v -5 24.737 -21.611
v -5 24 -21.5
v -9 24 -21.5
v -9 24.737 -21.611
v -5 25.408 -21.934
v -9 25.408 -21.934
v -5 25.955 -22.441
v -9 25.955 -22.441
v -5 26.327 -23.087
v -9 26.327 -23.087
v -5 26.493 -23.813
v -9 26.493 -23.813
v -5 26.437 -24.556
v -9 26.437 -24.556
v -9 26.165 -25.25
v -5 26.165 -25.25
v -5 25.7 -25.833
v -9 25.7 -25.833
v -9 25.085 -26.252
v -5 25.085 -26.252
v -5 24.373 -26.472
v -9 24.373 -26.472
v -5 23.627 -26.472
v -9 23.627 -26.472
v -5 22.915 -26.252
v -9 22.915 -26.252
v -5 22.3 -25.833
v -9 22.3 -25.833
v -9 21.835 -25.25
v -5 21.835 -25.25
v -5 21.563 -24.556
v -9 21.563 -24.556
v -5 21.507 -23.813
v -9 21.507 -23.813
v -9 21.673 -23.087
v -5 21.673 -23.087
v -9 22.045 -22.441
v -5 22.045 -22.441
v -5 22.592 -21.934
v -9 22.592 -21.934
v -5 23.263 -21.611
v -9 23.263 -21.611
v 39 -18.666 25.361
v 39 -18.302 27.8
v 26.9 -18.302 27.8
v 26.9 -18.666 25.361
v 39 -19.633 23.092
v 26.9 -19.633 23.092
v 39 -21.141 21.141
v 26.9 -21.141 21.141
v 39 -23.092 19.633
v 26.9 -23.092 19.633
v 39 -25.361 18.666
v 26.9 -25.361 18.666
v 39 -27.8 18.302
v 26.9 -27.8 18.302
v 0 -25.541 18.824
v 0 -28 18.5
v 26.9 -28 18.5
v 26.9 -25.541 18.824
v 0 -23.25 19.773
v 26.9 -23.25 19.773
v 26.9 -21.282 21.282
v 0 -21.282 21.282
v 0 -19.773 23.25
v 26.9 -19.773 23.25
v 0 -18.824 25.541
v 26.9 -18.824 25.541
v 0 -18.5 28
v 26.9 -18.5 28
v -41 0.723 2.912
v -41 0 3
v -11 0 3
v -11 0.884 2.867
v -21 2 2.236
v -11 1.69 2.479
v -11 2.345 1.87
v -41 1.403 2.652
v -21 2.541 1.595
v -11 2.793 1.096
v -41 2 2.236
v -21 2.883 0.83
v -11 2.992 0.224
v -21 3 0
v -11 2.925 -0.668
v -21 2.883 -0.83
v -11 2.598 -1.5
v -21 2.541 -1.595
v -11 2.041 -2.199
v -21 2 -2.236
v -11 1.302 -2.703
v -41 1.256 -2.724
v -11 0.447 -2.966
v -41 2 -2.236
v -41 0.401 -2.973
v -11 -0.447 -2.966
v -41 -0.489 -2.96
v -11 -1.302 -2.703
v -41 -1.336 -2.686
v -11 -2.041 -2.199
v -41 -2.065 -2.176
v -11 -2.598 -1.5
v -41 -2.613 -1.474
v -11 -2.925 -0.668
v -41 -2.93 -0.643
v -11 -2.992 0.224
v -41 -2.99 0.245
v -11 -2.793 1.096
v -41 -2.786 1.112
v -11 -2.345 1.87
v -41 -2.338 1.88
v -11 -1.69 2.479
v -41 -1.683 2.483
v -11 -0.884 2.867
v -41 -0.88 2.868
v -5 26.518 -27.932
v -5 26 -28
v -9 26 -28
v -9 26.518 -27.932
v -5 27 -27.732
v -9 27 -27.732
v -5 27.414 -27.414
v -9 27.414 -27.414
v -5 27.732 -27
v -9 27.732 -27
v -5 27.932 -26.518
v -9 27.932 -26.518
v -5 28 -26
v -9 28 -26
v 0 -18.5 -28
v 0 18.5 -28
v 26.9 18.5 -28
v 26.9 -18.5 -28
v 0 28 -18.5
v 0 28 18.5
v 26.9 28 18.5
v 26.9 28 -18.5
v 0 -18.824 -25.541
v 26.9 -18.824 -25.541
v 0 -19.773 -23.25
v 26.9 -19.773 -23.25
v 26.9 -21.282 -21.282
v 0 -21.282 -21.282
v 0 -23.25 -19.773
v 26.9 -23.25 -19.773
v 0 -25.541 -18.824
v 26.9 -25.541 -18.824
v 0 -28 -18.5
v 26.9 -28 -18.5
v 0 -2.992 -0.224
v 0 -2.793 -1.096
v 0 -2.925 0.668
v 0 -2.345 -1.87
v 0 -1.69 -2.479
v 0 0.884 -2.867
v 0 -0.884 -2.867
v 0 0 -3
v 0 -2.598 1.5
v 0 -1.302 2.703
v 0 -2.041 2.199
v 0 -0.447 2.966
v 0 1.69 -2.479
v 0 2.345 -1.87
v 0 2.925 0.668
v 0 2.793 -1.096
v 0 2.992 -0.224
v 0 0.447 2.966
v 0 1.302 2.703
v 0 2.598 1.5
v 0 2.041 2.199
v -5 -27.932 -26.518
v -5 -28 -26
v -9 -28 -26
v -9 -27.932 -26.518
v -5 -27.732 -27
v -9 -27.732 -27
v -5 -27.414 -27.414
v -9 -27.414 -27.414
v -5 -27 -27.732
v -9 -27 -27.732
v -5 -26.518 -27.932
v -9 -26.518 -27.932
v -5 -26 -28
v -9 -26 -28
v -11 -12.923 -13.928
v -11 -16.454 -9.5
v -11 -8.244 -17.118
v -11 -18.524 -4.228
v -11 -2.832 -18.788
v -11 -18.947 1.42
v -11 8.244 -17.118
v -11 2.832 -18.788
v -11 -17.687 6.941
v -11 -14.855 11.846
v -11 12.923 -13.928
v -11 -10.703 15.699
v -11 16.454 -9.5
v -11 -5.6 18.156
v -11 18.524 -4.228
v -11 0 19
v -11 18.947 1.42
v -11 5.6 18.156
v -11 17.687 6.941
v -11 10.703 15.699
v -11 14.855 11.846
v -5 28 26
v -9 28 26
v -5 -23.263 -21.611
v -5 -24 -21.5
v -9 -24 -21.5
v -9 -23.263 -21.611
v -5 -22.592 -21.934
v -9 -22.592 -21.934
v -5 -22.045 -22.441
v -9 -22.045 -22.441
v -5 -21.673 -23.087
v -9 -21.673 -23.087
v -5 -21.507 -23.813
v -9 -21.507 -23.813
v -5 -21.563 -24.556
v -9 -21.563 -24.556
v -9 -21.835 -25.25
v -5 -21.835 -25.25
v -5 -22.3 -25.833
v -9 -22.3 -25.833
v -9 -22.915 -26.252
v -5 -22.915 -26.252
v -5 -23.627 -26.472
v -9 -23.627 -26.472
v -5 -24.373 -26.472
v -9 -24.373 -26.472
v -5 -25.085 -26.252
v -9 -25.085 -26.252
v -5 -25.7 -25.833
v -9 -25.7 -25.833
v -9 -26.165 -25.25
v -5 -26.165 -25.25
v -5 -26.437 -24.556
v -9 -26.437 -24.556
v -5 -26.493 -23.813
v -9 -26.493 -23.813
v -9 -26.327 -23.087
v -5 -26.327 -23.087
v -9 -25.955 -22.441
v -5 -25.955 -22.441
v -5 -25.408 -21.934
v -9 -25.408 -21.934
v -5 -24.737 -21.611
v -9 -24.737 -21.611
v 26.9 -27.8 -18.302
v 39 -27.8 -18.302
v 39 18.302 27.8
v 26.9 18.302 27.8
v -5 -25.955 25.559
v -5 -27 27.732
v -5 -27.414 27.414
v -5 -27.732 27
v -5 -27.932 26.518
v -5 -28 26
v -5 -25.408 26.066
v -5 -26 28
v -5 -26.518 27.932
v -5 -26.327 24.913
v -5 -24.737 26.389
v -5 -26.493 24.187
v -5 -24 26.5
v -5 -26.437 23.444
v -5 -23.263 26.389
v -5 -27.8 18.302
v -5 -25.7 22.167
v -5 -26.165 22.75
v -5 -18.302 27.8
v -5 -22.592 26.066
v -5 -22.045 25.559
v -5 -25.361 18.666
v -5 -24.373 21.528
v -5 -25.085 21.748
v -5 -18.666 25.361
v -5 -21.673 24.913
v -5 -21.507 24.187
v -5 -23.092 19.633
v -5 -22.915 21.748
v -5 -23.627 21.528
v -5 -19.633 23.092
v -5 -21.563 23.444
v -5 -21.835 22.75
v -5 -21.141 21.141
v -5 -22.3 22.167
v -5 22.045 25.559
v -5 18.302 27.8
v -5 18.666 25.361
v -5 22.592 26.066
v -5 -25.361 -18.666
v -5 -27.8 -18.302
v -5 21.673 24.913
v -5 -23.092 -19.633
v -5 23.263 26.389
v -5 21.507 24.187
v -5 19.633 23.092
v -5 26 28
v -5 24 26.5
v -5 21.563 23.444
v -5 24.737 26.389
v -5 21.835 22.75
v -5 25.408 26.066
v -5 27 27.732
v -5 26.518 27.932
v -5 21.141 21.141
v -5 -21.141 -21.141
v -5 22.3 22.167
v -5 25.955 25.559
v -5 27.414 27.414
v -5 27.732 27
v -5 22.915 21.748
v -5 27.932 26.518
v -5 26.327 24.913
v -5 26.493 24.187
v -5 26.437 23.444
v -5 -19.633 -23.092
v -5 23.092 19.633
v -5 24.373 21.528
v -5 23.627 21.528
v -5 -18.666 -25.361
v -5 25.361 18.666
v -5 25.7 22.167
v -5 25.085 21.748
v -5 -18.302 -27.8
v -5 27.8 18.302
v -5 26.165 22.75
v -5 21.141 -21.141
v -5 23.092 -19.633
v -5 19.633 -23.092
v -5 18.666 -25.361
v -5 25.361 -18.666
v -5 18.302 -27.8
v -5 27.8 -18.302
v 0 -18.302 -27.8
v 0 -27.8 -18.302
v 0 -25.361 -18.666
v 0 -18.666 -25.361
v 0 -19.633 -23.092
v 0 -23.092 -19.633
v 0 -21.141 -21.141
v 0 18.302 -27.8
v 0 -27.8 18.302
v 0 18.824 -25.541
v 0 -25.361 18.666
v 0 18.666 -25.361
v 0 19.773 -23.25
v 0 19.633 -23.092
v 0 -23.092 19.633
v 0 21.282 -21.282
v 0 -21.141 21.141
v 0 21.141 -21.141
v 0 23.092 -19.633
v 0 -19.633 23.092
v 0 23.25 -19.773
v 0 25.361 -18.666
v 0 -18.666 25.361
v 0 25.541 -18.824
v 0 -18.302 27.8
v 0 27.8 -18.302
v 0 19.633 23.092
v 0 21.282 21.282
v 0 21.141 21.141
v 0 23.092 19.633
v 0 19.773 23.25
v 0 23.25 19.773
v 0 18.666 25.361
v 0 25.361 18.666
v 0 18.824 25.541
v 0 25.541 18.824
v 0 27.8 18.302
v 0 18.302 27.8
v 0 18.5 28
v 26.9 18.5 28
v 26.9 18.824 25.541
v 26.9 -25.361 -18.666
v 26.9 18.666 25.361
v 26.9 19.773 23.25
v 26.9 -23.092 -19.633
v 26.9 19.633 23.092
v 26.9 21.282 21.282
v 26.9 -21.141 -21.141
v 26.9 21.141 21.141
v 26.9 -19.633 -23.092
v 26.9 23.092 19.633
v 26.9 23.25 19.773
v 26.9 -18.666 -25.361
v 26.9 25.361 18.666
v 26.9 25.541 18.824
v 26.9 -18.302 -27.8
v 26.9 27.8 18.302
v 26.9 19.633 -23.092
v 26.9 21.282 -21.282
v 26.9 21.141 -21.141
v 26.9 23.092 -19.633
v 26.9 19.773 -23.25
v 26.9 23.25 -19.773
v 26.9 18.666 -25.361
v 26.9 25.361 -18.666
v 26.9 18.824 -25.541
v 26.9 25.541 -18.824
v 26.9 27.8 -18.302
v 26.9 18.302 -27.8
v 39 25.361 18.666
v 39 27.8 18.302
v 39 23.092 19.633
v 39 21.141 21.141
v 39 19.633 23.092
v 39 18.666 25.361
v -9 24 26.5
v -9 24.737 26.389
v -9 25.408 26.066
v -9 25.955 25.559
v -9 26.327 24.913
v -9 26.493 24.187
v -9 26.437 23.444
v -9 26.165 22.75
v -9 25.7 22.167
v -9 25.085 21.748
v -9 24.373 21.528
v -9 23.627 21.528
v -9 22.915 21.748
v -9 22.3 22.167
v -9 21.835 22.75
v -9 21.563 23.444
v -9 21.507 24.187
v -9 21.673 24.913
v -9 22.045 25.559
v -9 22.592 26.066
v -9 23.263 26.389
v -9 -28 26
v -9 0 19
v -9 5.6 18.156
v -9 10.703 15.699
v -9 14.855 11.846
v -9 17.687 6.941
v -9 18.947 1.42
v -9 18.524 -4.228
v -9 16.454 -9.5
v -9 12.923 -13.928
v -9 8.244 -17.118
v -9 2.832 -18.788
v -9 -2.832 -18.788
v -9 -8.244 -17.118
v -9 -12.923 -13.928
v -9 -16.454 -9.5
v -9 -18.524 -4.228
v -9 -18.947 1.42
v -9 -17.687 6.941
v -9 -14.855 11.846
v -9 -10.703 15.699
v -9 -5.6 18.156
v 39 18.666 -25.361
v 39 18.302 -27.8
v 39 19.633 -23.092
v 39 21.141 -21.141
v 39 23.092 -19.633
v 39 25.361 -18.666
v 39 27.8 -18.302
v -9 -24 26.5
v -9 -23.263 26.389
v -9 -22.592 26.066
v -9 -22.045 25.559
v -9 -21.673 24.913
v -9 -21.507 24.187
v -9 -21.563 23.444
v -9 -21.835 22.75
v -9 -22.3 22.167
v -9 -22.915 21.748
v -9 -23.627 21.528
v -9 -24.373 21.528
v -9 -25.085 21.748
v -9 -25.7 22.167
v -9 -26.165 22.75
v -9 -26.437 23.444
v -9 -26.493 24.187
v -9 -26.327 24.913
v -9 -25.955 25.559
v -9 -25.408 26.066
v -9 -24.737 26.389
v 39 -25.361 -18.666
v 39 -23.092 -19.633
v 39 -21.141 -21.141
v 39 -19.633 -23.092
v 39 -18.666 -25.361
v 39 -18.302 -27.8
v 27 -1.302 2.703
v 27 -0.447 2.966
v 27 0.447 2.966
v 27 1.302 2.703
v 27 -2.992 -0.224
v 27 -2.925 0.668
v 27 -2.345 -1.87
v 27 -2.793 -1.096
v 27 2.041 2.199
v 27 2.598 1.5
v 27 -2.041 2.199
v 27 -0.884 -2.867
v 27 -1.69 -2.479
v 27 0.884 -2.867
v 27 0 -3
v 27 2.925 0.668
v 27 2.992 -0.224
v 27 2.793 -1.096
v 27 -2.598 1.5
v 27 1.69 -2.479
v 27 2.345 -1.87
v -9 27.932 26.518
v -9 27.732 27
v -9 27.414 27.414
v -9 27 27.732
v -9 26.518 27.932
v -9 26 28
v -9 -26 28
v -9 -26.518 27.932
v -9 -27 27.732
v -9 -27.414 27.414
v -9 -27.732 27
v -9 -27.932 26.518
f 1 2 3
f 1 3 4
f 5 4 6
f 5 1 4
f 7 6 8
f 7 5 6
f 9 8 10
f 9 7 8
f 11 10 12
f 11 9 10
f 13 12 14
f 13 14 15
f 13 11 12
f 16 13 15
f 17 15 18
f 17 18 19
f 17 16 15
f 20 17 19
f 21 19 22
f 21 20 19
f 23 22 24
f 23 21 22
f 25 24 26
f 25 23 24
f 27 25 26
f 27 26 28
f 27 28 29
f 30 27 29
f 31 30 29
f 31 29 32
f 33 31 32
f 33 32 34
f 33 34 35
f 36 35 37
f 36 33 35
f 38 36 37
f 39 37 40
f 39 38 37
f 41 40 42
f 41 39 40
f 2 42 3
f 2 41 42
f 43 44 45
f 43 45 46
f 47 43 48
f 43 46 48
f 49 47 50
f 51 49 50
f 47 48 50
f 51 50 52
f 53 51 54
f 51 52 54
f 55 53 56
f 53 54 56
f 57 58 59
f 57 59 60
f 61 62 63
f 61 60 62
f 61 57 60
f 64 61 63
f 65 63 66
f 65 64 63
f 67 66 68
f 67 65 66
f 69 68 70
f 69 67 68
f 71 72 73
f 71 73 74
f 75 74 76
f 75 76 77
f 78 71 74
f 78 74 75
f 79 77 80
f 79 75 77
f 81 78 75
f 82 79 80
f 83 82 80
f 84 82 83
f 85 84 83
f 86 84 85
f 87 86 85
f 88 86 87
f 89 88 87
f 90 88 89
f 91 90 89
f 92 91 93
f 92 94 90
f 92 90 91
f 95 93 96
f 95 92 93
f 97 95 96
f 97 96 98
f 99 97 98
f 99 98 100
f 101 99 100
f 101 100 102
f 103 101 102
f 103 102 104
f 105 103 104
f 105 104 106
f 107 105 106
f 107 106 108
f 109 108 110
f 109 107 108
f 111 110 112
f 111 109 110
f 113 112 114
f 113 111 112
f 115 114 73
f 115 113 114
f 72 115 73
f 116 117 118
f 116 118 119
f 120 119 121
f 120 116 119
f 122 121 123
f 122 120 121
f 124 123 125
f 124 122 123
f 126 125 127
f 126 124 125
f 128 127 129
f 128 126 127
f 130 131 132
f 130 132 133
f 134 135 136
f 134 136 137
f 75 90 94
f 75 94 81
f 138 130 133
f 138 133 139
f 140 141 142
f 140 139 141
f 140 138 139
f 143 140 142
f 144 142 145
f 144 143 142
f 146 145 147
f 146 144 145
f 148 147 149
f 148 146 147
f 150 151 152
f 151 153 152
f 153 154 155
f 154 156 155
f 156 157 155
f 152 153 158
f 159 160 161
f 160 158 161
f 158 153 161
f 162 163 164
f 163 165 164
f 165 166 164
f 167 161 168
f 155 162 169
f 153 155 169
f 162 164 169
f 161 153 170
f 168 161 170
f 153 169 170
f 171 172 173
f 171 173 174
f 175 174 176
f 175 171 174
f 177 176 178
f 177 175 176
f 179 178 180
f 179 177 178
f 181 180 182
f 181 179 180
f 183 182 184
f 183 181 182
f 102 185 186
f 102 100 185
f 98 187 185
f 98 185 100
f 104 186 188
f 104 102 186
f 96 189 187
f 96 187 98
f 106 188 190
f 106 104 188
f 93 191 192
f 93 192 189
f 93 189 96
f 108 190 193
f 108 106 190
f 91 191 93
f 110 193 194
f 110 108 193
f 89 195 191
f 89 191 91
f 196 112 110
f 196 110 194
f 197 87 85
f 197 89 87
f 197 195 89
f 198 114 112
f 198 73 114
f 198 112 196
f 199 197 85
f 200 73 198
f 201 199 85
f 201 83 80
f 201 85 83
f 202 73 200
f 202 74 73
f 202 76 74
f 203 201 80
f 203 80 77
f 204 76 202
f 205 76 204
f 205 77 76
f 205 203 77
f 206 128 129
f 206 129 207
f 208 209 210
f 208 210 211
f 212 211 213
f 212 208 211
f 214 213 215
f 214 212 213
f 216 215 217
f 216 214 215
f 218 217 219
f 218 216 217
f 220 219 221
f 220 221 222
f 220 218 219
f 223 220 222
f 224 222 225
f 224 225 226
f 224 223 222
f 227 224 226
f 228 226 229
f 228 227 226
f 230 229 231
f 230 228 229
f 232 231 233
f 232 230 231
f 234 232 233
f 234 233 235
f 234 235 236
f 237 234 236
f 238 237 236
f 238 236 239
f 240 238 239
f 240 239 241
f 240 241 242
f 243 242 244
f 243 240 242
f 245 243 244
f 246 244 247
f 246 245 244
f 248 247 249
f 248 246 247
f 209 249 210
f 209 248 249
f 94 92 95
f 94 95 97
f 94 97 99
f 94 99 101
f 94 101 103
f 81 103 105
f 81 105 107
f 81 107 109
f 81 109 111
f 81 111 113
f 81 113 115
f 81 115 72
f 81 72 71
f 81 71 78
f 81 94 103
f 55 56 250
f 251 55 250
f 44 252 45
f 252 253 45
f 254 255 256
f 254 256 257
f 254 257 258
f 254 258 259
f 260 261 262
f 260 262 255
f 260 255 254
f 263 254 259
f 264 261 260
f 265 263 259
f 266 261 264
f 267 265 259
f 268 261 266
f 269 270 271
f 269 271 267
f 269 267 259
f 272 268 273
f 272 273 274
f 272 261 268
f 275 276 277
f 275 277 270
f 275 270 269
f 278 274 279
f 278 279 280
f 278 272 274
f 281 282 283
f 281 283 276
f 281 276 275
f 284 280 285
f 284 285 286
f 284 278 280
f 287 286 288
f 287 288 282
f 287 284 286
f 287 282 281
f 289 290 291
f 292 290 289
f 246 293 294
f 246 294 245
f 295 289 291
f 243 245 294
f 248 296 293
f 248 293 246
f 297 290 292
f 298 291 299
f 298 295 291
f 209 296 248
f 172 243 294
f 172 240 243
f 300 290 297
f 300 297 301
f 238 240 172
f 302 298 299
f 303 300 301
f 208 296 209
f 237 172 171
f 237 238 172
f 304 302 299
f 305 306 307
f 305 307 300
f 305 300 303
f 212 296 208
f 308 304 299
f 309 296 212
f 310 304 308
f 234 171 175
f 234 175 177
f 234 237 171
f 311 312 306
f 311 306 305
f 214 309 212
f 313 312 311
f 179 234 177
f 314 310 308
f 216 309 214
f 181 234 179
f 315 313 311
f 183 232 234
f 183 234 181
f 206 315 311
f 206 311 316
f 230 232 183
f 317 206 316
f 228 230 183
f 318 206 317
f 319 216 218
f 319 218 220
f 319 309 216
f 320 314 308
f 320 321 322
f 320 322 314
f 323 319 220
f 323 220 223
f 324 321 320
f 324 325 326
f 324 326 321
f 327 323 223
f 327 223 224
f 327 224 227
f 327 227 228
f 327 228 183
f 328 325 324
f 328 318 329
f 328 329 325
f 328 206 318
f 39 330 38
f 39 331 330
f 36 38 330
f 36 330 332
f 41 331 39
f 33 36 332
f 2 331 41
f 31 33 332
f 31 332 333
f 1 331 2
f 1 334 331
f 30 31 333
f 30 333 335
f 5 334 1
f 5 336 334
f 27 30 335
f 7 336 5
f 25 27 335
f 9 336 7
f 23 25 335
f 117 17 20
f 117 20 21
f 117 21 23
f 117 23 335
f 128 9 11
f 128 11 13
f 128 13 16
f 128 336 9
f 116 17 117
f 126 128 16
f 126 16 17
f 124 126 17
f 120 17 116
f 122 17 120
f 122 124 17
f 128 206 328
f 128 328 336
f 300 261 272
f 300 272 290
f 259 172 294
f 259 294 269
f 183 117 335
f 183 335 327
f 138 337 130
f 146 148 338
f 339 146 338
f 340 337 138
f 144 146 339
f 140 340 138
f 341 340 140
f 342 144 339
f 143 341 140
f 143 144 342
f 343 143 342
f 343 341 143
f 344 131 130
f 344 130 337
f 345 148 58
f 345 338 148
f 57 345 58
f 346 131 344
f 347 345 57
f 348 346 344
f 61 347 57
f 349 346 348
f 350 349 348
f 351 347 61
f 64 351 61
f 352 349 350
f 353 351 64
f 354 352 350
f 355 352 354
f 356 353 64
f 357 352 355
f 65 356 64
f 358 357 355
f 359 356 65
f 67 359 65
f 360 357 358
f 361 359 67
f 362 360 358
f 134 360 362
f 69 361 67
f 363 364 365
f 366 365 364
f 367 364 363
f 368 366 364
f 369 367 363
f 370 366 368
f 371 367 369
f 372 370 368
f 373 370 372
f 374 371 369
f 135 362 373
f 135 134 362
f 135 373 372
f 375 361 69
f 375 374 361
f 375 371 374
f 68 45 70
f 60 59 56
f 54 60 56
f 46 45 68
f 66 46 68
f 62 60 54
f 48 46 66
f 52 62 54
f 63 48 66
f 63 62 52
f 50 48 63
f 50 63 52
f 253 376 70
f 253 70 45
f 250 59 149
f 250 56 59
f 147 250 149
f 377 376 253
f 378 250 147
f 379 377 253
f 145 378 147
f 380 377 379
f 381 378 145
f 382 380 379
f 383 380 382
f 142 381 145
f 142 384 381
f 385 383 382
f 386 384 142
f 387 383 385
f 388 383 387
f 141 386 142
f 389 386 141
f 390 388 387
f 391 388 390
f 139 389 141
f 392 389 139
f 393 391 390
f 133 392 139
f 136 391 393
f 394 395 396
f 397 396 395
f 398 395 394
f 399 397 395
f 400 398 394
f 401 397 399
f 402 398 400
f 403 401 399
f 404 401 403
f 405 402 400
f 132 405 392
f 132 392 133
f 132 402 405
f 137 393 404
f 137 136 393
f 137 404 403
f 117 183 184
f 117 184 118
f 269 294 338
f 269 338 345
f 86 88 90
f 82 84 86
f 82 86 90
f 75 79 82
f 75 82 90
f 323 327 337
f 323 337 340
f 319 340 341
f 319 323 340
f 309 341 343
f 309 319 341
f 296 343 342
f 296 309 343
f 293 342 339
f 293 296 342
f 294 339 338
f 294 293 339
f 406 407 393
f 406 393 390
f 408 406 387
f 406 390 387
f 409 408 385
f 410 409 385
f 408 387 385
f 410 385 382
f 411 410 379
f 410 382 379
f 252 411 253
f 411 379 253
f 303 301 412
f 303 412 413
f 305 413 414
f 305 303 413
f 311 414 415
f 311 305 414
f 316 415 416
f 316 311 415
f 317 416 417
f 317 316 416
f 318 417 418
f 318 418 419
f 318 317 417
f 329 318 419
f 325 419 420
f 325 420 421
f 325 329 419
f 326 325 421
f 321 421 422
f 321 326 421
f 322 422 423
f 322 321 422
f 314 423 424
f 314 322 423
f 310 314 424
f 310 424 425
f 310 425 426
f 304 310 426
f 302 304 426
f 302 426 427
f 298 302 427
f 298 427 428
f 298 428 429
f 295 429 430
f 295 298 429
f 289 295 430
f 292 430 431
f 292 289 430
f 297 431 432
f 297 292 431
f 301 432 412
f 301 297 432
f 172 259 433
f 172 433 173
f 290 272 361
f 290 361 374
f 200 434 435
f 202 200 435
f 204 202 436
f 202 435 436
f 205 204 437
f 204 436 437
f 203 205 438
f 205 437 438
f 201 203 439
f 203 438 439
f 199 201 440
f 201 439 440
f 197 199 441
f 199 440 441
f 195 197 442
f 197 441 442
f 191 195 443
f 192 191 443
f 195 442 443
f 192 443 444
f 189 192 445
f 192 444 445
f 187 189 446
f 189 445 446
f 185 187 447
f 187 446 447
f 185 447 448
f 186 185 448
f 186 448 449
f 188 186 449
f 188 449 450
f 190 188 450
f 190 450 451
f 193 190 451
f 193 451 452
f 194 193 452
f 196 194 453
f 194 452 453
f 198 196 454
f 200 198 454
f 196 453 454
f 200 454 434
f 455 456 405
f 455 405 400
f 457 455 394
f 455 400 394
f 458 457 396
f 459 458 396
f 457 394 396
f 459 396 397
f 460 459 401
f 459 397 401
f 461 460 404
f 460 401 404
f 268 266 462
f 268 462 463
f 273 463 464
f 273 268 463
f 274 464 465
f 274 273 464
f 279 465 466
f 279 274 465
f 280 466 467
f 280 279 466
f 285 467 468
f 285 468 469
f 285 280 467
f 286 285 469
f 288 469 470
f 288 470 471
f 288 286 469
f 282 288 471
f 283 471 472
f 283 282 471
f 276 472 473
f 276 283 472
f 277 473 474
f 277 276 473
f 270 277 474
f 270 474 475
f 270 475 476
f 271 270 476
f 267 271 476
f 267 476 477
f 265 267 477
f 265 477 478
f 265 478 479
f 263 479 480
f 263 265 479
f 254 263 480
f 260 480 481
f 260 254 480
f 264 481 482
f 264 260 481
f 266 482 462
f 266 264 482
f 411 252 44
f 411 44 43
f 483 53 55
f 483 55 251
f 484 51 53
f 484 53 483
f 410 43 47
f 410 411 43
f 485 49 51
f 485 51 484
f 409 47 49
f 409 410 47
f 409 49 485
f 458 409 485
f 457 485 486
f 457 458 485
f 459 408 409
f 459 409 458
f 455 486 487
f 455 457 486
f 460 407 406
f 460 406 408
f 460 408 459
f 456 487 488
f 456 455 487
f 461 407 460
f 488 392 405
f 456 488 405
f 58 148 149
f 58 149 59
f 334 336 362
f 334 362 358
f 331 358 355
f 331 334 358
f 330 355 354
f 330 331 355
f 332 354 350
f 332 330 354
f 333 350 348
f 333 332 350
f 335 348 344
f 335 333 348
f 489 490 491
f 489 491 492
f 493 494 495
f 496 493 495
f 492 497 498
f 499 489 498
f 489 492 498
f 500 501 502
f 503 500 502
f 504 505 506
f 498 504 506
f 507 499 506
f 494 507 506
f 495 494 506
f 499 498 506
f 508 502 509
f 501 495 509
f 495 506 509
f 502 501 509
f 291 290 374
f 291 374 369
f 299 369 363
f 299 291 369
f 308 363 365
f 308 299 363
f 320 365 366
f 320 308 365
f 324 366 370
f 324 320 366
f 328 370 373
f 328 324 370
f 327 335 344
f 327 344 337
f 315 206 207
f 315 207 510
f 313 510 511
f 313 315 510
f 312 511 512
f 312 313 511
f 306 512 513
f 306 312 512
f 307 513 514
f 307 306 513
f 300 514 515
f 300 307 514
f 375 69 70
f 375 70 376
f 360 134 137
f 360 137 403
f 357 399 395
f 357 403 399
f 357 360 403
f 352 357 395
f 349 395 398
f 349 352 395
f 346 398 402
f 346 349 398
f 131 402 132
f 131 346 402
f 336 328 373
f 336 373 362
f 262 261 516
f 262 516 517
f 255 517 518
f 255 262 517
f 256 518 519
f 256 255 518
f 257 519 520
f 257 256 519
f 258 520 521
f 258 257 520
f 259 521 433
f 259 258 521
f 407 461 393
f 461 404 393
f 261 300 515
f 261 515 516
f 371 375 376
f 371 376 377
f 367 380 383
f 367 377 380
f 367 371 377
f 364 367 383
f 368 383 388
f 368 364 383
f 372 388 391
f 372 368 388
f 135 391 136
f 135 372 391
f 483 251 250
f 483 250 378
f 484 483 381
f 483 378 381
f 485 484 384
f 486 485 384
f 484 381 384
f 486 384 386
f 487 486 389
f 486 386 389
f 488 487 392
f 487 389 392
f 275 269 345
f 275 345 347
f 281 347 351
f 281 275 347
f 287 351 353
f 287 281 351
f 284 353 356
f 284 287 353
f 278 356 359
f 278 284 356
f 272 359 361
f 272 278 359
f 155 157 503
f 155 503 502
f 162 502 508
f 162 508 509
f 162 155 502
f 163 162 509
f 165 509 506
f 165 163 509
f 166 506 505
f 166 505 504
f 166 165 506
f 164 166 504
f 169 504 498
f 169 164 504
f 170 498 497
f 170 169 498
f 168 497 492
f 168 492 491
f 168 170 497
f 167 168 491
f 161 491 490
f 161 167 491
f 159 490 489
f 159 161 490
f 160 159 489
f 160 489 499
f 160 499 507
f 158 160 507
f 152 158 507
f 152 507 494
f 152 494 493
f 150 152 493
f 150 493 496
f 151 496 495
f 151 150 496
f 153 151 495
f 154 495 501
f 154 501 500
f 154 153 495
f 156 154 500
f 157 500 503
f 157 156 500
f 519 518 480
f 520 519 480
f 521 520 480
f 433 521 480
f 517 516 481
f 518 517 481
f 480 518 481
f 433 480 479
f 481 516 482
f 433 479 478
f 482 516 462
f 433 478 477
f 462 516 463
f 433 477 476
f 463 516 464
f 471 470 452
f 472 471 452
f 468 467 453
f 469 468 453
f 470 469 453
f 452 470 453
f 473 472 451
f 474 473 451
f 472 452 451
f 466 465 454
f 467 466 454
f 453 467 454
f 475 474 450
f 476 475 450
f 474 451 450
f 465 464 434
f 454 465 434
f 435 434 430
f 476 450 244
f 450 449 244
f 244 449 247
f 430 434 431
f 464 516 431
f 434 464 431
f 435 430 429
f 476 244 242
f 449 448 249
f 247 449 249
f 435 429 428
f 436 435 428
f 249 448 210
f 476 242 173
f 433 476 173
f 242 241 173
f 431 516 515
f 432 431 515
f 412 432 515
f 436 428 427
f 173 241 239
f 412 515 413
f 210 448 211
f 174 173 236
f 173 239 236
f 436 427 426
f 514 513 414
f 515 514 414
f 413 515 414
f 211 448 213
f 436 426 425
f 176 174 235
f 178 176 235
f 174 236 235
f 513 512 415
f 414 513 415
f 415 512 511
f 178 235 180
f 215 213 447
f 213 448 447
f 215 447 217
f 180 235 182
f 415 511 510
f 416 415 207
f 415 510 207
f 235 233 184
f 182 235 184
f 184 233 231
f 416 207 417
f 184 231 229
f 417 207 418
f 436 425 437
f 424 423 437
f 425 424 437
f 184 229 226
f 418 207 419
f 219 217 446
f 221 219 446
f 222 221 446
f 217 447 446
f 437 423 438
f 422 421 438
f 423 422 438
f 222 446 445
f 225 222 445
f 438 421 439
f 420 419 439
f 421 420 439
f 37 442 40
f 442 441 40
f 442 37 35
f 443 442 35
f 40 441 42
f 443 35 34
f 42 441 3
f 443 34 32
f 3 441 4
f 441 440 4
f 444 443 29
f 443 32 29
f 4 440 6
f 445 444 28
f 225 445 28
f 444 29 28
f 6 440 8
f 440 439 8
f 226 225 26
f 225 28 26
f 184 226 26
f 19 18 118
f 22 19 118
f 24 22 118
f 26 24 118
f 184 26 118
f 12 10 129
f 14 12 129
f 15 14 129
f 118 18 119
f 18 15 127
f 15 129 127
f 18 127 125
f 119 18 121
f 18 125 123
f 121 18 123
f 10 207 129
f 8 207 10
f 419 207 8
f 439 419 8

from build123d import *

# Parameters (mm, degrees)
SKETCH1_R           = 3
BOSS_EXTRUDE1_DEPTH = 27
CUT_EXTRUDE4_START  = -0.1
CUT_EXTRUDE4_DEPTH  = 0.1
BOSS_EXTRUDE4_DEPTH = 12
BOSS_EXTRUDE5_START = 5
BOSS_EXTRUDE5_DEPTH = 5
SKETCH14_R          = 2.5
BOSS_EXTRUDE7_DEPTH = 4
SKETCH15_R          = 19
BOSS_EXTRUDE8_DEPTH = 2
BOSS_EXTRUDE9_START = 30
SKETCH16_R          = 3
BOSS_EXTRUDE9_DEPTH = 30
SKETCH17_W          = 6
SKETCH17_H          = 6
CUT_EXTRUDE5_DEPTH  = 20


with BuildPart() as part:
    # Sketch1 → Boss-Extrude1 (new body)
    with BuildSketch(Plane(origin=(0, 0, 0), x_dir=(0, 0, -1), z_dir=(1, 0, 0))):
        with BuildLine():
            Line((-18.5, 28), (18.5, 28))
            ThreePointArc((18.5, 28), (21.282485579, 21.282485579), (28, 18.5))
            Line((28, 18.5), (28, -18.5))
            ThreePointArc((28, -18.5), (21.282485579, -21.282485579), (18.5, -28))
            Line((18.5, -28), (-18.5, -28))
            ThreePointArc((-18.5, -28), (-21.282485579, -21.282485579), (-28, -18.5))
            Line((-28, -18.5), (-28, 18.5))
            ThreePointArc((-28, 18.5), (-21.282485579, 21.282485579), (-18.5, 28))
        make_face()
        Circle(SKETCH1_R, mode=Mode.SUBTRACT)
    extrude(amount=BOSS_EXTRUDE1_DEPTH)

    # Sketch6 → Cut-Extrude4 (cut)
    with BuildSketch(Plane(origin=(27, 0, 0), x_dir=(0, 0, -1), z_dir=(1, 0, 0)).offset(CUT_EXTRUDE4_START)):
        with BuildLine():
            Line((28, -18.5), (28, 18.5))
            ThreePointArc((28, 18.5), (21.282485579, 21.282485579), (18.5, 28))
            Line((18.5, 28), (-18.5, 28))
            ThreePointArc((-18.5, 28), (-21.282485579, 21.282485579), (-28, 18.5))
            Line((-28, 18.5), (-28, -18.5))
            ThreePointArc((-28, -18.5), (-21.282485579, -21.282485579), (-18.5, -28))
            Line((-18.5, -28), (18.5, -28))
            ThreePointArc((18.5, -28), (21.282485579, -21.282485579), (28, -18.5))
        make_face()
        with BuildLine():
            Line((18.302062075, 27.8), (-18.302062075, 27.8))
            ThreePointArc((-18.302062075, 27.8), (-21.141064222, 21.141064222), (-27.8, 18.302062075))
            Line((-27.8, 18.302062075), (-27.8, -18.302062075))
            ThreePointArc((-27.8, -18.302062075), (-21.141064222, -21.141064222), (-18.302062075, -27.8))
            Line((-18.302062075, -27.8), (18.302062075, -27.8))
            ThreePointArc((18.302062075, -27.8), (21.141064222, -21.141064222), (27.8, -18.302062075))
            Line((27.8, -18.302062075), (27.8, 18.302062075))
            ThreePointArc((27.8, 18.302062075), (21.141064222, 21.141064222), (18.302062075, 27.8))
        make_face(mode=Mode.SUBTRACT)
    extrude(amount=CUT_EXTRUDE4_DEPTH, mode=Mode.SUBTRACT)

    # Sketch10 → Boss-Extrude4 (add)
    with BuildSketch(Plane(origin=(27, 0, 0), x_dir=(0, 0, -1), z_dir=(1, 0, 0))):
        with BuildLine():
            Line((27.8, -18.302062075), (27.8, 18.302062075))
            ThreePointArc((27.8, 18.302062075), (21.141064222, 21.141064222), (18.302062075, 27.8))
            Line((18.302062075, 27.8), (-18.302062075, 27.8))
            ThreePointArc((-18.302062075, 27.8), (-21.141064222, 21.141064222), (-27.8, 18.302062075))
            Line((-27.8, 18.302062075), (-27.8, -18.302062075))
            ThreePointArc((-27.8, -18.302062075), (-21.141064222, -21.141064222), (-18.302062075, -27.8))
            Line((-18.302062075, -27.8), (18.302062075, -27.8))
            ThreePointArc((18.302062075, -27.8), (21.141064222, -21.141064222), (27.8, -18.302062075))
        make_face()
    extrude(amount=BOSS_EXTRUDE4_DEPTH)

    # Sketch12 → Boss-Extrude5 (add)
    with BuildSketch(Plane.ZY.offset(BOSS_EXTRUDE5_START)):
        with BuildLine():
            Line((-27.8, 18.302062075), (-27.8, -18.302062075))
            ThreePointArc((-27.8, -18.302062075), (-21.141064222, -21.141064222), (-18.302062075, -27.8))
            Line((-18.302062075, -27.8), (18.302062075, -27.8))
            ThreePointArc((18.302062075, -27.8), (21.141064222, -21.141064222), (27.8, -18.302062075))
            Line((27.8, -18.302062075), (27.8, 18.302062075))
            ThreePointArc((27.8, 18.302062075), (21.141064222, 21.141064222), (18.302062075, 27.8))
            Line((18.302062075, 27.8), (-18.302062075, 27.8))
            ThreePointArc((-18.302062075, 27.8), (-21.141064222, 21.141064222), (-27.8, 18.302062075))
        make_face()
    extrude(amount=-BOSS_EXTRUDE5_DEPTH)

    # Sketch14 → Boss-Extrude7 (add)
    with BuildSketch(Plane.ZY.offset(5)):
        with BuildLine():
            Line((-26, 28), (26, 28))
            ThreePointArc((26, 28), (27.414213562, 27.414213562), (28, 26))
            Line((28, 26), (28, -26))
            ThreePointArc((28, -26), (27.414213562, -27.414213562), (26, -28))
            Line((26, -28), (-26, -28))
            ThreePointArc((-26, -28), (-27.414213562, -27.414213562), (-28, -26))
            Line((-28, -26), (-28, 26))
            ThreePointArc((-28, 26), (-27.414213562, 27.414213562), (-26, 28))
        make_face()
        with Locations((-24, 24)):
            Circle(SKETCH14_R, mode=Mode.SUBTRACT)
        with Locations((24, 24)):
            Circle(SKETCH14_R, mode=Mode.SUBTRACT)
        with Locations((24, -24)):
            Circle(SKETCH14_R, mode=Mode.SUBTRACT)
        with Locations((-24, -24)):
            Circle(SKETCH14_R, mode=Mode.SUBTRACT)
    extrude(amount=BOSS_EXTRUDE7_DEPTH)

    # Sketch15 → Boss-Extrude8 (add)
    with BuildSketch(Plane.ZY.offset(9)):
        Circle(SKETCH15_R)
    extrude(amount=BOSS_EXTRUDE8_DEPTH)

    # Sketch16 → Boss-Extrude9 (add)
    with BuildSketch(Plane.ZY.offset(11).offset(BOSS_EXTRUDE9_START)):
        Circle(SKETCH16_R)
    extrude(amount=-BOSS_EXTRUDE9_DEPTH)

    # Sketch17 → Cut-Extrude5 (cut)
    with BuildSketch(Plane.ZY.offset(41)):
        with Locations((0, 5)):
            Rectangle(SKETCH17_W, SKETCH17_H)
    extrude(amount=-CUT_EXTRUDE5_DEPTH, mode=Mode.SUBTRACT)


solid = part.part
